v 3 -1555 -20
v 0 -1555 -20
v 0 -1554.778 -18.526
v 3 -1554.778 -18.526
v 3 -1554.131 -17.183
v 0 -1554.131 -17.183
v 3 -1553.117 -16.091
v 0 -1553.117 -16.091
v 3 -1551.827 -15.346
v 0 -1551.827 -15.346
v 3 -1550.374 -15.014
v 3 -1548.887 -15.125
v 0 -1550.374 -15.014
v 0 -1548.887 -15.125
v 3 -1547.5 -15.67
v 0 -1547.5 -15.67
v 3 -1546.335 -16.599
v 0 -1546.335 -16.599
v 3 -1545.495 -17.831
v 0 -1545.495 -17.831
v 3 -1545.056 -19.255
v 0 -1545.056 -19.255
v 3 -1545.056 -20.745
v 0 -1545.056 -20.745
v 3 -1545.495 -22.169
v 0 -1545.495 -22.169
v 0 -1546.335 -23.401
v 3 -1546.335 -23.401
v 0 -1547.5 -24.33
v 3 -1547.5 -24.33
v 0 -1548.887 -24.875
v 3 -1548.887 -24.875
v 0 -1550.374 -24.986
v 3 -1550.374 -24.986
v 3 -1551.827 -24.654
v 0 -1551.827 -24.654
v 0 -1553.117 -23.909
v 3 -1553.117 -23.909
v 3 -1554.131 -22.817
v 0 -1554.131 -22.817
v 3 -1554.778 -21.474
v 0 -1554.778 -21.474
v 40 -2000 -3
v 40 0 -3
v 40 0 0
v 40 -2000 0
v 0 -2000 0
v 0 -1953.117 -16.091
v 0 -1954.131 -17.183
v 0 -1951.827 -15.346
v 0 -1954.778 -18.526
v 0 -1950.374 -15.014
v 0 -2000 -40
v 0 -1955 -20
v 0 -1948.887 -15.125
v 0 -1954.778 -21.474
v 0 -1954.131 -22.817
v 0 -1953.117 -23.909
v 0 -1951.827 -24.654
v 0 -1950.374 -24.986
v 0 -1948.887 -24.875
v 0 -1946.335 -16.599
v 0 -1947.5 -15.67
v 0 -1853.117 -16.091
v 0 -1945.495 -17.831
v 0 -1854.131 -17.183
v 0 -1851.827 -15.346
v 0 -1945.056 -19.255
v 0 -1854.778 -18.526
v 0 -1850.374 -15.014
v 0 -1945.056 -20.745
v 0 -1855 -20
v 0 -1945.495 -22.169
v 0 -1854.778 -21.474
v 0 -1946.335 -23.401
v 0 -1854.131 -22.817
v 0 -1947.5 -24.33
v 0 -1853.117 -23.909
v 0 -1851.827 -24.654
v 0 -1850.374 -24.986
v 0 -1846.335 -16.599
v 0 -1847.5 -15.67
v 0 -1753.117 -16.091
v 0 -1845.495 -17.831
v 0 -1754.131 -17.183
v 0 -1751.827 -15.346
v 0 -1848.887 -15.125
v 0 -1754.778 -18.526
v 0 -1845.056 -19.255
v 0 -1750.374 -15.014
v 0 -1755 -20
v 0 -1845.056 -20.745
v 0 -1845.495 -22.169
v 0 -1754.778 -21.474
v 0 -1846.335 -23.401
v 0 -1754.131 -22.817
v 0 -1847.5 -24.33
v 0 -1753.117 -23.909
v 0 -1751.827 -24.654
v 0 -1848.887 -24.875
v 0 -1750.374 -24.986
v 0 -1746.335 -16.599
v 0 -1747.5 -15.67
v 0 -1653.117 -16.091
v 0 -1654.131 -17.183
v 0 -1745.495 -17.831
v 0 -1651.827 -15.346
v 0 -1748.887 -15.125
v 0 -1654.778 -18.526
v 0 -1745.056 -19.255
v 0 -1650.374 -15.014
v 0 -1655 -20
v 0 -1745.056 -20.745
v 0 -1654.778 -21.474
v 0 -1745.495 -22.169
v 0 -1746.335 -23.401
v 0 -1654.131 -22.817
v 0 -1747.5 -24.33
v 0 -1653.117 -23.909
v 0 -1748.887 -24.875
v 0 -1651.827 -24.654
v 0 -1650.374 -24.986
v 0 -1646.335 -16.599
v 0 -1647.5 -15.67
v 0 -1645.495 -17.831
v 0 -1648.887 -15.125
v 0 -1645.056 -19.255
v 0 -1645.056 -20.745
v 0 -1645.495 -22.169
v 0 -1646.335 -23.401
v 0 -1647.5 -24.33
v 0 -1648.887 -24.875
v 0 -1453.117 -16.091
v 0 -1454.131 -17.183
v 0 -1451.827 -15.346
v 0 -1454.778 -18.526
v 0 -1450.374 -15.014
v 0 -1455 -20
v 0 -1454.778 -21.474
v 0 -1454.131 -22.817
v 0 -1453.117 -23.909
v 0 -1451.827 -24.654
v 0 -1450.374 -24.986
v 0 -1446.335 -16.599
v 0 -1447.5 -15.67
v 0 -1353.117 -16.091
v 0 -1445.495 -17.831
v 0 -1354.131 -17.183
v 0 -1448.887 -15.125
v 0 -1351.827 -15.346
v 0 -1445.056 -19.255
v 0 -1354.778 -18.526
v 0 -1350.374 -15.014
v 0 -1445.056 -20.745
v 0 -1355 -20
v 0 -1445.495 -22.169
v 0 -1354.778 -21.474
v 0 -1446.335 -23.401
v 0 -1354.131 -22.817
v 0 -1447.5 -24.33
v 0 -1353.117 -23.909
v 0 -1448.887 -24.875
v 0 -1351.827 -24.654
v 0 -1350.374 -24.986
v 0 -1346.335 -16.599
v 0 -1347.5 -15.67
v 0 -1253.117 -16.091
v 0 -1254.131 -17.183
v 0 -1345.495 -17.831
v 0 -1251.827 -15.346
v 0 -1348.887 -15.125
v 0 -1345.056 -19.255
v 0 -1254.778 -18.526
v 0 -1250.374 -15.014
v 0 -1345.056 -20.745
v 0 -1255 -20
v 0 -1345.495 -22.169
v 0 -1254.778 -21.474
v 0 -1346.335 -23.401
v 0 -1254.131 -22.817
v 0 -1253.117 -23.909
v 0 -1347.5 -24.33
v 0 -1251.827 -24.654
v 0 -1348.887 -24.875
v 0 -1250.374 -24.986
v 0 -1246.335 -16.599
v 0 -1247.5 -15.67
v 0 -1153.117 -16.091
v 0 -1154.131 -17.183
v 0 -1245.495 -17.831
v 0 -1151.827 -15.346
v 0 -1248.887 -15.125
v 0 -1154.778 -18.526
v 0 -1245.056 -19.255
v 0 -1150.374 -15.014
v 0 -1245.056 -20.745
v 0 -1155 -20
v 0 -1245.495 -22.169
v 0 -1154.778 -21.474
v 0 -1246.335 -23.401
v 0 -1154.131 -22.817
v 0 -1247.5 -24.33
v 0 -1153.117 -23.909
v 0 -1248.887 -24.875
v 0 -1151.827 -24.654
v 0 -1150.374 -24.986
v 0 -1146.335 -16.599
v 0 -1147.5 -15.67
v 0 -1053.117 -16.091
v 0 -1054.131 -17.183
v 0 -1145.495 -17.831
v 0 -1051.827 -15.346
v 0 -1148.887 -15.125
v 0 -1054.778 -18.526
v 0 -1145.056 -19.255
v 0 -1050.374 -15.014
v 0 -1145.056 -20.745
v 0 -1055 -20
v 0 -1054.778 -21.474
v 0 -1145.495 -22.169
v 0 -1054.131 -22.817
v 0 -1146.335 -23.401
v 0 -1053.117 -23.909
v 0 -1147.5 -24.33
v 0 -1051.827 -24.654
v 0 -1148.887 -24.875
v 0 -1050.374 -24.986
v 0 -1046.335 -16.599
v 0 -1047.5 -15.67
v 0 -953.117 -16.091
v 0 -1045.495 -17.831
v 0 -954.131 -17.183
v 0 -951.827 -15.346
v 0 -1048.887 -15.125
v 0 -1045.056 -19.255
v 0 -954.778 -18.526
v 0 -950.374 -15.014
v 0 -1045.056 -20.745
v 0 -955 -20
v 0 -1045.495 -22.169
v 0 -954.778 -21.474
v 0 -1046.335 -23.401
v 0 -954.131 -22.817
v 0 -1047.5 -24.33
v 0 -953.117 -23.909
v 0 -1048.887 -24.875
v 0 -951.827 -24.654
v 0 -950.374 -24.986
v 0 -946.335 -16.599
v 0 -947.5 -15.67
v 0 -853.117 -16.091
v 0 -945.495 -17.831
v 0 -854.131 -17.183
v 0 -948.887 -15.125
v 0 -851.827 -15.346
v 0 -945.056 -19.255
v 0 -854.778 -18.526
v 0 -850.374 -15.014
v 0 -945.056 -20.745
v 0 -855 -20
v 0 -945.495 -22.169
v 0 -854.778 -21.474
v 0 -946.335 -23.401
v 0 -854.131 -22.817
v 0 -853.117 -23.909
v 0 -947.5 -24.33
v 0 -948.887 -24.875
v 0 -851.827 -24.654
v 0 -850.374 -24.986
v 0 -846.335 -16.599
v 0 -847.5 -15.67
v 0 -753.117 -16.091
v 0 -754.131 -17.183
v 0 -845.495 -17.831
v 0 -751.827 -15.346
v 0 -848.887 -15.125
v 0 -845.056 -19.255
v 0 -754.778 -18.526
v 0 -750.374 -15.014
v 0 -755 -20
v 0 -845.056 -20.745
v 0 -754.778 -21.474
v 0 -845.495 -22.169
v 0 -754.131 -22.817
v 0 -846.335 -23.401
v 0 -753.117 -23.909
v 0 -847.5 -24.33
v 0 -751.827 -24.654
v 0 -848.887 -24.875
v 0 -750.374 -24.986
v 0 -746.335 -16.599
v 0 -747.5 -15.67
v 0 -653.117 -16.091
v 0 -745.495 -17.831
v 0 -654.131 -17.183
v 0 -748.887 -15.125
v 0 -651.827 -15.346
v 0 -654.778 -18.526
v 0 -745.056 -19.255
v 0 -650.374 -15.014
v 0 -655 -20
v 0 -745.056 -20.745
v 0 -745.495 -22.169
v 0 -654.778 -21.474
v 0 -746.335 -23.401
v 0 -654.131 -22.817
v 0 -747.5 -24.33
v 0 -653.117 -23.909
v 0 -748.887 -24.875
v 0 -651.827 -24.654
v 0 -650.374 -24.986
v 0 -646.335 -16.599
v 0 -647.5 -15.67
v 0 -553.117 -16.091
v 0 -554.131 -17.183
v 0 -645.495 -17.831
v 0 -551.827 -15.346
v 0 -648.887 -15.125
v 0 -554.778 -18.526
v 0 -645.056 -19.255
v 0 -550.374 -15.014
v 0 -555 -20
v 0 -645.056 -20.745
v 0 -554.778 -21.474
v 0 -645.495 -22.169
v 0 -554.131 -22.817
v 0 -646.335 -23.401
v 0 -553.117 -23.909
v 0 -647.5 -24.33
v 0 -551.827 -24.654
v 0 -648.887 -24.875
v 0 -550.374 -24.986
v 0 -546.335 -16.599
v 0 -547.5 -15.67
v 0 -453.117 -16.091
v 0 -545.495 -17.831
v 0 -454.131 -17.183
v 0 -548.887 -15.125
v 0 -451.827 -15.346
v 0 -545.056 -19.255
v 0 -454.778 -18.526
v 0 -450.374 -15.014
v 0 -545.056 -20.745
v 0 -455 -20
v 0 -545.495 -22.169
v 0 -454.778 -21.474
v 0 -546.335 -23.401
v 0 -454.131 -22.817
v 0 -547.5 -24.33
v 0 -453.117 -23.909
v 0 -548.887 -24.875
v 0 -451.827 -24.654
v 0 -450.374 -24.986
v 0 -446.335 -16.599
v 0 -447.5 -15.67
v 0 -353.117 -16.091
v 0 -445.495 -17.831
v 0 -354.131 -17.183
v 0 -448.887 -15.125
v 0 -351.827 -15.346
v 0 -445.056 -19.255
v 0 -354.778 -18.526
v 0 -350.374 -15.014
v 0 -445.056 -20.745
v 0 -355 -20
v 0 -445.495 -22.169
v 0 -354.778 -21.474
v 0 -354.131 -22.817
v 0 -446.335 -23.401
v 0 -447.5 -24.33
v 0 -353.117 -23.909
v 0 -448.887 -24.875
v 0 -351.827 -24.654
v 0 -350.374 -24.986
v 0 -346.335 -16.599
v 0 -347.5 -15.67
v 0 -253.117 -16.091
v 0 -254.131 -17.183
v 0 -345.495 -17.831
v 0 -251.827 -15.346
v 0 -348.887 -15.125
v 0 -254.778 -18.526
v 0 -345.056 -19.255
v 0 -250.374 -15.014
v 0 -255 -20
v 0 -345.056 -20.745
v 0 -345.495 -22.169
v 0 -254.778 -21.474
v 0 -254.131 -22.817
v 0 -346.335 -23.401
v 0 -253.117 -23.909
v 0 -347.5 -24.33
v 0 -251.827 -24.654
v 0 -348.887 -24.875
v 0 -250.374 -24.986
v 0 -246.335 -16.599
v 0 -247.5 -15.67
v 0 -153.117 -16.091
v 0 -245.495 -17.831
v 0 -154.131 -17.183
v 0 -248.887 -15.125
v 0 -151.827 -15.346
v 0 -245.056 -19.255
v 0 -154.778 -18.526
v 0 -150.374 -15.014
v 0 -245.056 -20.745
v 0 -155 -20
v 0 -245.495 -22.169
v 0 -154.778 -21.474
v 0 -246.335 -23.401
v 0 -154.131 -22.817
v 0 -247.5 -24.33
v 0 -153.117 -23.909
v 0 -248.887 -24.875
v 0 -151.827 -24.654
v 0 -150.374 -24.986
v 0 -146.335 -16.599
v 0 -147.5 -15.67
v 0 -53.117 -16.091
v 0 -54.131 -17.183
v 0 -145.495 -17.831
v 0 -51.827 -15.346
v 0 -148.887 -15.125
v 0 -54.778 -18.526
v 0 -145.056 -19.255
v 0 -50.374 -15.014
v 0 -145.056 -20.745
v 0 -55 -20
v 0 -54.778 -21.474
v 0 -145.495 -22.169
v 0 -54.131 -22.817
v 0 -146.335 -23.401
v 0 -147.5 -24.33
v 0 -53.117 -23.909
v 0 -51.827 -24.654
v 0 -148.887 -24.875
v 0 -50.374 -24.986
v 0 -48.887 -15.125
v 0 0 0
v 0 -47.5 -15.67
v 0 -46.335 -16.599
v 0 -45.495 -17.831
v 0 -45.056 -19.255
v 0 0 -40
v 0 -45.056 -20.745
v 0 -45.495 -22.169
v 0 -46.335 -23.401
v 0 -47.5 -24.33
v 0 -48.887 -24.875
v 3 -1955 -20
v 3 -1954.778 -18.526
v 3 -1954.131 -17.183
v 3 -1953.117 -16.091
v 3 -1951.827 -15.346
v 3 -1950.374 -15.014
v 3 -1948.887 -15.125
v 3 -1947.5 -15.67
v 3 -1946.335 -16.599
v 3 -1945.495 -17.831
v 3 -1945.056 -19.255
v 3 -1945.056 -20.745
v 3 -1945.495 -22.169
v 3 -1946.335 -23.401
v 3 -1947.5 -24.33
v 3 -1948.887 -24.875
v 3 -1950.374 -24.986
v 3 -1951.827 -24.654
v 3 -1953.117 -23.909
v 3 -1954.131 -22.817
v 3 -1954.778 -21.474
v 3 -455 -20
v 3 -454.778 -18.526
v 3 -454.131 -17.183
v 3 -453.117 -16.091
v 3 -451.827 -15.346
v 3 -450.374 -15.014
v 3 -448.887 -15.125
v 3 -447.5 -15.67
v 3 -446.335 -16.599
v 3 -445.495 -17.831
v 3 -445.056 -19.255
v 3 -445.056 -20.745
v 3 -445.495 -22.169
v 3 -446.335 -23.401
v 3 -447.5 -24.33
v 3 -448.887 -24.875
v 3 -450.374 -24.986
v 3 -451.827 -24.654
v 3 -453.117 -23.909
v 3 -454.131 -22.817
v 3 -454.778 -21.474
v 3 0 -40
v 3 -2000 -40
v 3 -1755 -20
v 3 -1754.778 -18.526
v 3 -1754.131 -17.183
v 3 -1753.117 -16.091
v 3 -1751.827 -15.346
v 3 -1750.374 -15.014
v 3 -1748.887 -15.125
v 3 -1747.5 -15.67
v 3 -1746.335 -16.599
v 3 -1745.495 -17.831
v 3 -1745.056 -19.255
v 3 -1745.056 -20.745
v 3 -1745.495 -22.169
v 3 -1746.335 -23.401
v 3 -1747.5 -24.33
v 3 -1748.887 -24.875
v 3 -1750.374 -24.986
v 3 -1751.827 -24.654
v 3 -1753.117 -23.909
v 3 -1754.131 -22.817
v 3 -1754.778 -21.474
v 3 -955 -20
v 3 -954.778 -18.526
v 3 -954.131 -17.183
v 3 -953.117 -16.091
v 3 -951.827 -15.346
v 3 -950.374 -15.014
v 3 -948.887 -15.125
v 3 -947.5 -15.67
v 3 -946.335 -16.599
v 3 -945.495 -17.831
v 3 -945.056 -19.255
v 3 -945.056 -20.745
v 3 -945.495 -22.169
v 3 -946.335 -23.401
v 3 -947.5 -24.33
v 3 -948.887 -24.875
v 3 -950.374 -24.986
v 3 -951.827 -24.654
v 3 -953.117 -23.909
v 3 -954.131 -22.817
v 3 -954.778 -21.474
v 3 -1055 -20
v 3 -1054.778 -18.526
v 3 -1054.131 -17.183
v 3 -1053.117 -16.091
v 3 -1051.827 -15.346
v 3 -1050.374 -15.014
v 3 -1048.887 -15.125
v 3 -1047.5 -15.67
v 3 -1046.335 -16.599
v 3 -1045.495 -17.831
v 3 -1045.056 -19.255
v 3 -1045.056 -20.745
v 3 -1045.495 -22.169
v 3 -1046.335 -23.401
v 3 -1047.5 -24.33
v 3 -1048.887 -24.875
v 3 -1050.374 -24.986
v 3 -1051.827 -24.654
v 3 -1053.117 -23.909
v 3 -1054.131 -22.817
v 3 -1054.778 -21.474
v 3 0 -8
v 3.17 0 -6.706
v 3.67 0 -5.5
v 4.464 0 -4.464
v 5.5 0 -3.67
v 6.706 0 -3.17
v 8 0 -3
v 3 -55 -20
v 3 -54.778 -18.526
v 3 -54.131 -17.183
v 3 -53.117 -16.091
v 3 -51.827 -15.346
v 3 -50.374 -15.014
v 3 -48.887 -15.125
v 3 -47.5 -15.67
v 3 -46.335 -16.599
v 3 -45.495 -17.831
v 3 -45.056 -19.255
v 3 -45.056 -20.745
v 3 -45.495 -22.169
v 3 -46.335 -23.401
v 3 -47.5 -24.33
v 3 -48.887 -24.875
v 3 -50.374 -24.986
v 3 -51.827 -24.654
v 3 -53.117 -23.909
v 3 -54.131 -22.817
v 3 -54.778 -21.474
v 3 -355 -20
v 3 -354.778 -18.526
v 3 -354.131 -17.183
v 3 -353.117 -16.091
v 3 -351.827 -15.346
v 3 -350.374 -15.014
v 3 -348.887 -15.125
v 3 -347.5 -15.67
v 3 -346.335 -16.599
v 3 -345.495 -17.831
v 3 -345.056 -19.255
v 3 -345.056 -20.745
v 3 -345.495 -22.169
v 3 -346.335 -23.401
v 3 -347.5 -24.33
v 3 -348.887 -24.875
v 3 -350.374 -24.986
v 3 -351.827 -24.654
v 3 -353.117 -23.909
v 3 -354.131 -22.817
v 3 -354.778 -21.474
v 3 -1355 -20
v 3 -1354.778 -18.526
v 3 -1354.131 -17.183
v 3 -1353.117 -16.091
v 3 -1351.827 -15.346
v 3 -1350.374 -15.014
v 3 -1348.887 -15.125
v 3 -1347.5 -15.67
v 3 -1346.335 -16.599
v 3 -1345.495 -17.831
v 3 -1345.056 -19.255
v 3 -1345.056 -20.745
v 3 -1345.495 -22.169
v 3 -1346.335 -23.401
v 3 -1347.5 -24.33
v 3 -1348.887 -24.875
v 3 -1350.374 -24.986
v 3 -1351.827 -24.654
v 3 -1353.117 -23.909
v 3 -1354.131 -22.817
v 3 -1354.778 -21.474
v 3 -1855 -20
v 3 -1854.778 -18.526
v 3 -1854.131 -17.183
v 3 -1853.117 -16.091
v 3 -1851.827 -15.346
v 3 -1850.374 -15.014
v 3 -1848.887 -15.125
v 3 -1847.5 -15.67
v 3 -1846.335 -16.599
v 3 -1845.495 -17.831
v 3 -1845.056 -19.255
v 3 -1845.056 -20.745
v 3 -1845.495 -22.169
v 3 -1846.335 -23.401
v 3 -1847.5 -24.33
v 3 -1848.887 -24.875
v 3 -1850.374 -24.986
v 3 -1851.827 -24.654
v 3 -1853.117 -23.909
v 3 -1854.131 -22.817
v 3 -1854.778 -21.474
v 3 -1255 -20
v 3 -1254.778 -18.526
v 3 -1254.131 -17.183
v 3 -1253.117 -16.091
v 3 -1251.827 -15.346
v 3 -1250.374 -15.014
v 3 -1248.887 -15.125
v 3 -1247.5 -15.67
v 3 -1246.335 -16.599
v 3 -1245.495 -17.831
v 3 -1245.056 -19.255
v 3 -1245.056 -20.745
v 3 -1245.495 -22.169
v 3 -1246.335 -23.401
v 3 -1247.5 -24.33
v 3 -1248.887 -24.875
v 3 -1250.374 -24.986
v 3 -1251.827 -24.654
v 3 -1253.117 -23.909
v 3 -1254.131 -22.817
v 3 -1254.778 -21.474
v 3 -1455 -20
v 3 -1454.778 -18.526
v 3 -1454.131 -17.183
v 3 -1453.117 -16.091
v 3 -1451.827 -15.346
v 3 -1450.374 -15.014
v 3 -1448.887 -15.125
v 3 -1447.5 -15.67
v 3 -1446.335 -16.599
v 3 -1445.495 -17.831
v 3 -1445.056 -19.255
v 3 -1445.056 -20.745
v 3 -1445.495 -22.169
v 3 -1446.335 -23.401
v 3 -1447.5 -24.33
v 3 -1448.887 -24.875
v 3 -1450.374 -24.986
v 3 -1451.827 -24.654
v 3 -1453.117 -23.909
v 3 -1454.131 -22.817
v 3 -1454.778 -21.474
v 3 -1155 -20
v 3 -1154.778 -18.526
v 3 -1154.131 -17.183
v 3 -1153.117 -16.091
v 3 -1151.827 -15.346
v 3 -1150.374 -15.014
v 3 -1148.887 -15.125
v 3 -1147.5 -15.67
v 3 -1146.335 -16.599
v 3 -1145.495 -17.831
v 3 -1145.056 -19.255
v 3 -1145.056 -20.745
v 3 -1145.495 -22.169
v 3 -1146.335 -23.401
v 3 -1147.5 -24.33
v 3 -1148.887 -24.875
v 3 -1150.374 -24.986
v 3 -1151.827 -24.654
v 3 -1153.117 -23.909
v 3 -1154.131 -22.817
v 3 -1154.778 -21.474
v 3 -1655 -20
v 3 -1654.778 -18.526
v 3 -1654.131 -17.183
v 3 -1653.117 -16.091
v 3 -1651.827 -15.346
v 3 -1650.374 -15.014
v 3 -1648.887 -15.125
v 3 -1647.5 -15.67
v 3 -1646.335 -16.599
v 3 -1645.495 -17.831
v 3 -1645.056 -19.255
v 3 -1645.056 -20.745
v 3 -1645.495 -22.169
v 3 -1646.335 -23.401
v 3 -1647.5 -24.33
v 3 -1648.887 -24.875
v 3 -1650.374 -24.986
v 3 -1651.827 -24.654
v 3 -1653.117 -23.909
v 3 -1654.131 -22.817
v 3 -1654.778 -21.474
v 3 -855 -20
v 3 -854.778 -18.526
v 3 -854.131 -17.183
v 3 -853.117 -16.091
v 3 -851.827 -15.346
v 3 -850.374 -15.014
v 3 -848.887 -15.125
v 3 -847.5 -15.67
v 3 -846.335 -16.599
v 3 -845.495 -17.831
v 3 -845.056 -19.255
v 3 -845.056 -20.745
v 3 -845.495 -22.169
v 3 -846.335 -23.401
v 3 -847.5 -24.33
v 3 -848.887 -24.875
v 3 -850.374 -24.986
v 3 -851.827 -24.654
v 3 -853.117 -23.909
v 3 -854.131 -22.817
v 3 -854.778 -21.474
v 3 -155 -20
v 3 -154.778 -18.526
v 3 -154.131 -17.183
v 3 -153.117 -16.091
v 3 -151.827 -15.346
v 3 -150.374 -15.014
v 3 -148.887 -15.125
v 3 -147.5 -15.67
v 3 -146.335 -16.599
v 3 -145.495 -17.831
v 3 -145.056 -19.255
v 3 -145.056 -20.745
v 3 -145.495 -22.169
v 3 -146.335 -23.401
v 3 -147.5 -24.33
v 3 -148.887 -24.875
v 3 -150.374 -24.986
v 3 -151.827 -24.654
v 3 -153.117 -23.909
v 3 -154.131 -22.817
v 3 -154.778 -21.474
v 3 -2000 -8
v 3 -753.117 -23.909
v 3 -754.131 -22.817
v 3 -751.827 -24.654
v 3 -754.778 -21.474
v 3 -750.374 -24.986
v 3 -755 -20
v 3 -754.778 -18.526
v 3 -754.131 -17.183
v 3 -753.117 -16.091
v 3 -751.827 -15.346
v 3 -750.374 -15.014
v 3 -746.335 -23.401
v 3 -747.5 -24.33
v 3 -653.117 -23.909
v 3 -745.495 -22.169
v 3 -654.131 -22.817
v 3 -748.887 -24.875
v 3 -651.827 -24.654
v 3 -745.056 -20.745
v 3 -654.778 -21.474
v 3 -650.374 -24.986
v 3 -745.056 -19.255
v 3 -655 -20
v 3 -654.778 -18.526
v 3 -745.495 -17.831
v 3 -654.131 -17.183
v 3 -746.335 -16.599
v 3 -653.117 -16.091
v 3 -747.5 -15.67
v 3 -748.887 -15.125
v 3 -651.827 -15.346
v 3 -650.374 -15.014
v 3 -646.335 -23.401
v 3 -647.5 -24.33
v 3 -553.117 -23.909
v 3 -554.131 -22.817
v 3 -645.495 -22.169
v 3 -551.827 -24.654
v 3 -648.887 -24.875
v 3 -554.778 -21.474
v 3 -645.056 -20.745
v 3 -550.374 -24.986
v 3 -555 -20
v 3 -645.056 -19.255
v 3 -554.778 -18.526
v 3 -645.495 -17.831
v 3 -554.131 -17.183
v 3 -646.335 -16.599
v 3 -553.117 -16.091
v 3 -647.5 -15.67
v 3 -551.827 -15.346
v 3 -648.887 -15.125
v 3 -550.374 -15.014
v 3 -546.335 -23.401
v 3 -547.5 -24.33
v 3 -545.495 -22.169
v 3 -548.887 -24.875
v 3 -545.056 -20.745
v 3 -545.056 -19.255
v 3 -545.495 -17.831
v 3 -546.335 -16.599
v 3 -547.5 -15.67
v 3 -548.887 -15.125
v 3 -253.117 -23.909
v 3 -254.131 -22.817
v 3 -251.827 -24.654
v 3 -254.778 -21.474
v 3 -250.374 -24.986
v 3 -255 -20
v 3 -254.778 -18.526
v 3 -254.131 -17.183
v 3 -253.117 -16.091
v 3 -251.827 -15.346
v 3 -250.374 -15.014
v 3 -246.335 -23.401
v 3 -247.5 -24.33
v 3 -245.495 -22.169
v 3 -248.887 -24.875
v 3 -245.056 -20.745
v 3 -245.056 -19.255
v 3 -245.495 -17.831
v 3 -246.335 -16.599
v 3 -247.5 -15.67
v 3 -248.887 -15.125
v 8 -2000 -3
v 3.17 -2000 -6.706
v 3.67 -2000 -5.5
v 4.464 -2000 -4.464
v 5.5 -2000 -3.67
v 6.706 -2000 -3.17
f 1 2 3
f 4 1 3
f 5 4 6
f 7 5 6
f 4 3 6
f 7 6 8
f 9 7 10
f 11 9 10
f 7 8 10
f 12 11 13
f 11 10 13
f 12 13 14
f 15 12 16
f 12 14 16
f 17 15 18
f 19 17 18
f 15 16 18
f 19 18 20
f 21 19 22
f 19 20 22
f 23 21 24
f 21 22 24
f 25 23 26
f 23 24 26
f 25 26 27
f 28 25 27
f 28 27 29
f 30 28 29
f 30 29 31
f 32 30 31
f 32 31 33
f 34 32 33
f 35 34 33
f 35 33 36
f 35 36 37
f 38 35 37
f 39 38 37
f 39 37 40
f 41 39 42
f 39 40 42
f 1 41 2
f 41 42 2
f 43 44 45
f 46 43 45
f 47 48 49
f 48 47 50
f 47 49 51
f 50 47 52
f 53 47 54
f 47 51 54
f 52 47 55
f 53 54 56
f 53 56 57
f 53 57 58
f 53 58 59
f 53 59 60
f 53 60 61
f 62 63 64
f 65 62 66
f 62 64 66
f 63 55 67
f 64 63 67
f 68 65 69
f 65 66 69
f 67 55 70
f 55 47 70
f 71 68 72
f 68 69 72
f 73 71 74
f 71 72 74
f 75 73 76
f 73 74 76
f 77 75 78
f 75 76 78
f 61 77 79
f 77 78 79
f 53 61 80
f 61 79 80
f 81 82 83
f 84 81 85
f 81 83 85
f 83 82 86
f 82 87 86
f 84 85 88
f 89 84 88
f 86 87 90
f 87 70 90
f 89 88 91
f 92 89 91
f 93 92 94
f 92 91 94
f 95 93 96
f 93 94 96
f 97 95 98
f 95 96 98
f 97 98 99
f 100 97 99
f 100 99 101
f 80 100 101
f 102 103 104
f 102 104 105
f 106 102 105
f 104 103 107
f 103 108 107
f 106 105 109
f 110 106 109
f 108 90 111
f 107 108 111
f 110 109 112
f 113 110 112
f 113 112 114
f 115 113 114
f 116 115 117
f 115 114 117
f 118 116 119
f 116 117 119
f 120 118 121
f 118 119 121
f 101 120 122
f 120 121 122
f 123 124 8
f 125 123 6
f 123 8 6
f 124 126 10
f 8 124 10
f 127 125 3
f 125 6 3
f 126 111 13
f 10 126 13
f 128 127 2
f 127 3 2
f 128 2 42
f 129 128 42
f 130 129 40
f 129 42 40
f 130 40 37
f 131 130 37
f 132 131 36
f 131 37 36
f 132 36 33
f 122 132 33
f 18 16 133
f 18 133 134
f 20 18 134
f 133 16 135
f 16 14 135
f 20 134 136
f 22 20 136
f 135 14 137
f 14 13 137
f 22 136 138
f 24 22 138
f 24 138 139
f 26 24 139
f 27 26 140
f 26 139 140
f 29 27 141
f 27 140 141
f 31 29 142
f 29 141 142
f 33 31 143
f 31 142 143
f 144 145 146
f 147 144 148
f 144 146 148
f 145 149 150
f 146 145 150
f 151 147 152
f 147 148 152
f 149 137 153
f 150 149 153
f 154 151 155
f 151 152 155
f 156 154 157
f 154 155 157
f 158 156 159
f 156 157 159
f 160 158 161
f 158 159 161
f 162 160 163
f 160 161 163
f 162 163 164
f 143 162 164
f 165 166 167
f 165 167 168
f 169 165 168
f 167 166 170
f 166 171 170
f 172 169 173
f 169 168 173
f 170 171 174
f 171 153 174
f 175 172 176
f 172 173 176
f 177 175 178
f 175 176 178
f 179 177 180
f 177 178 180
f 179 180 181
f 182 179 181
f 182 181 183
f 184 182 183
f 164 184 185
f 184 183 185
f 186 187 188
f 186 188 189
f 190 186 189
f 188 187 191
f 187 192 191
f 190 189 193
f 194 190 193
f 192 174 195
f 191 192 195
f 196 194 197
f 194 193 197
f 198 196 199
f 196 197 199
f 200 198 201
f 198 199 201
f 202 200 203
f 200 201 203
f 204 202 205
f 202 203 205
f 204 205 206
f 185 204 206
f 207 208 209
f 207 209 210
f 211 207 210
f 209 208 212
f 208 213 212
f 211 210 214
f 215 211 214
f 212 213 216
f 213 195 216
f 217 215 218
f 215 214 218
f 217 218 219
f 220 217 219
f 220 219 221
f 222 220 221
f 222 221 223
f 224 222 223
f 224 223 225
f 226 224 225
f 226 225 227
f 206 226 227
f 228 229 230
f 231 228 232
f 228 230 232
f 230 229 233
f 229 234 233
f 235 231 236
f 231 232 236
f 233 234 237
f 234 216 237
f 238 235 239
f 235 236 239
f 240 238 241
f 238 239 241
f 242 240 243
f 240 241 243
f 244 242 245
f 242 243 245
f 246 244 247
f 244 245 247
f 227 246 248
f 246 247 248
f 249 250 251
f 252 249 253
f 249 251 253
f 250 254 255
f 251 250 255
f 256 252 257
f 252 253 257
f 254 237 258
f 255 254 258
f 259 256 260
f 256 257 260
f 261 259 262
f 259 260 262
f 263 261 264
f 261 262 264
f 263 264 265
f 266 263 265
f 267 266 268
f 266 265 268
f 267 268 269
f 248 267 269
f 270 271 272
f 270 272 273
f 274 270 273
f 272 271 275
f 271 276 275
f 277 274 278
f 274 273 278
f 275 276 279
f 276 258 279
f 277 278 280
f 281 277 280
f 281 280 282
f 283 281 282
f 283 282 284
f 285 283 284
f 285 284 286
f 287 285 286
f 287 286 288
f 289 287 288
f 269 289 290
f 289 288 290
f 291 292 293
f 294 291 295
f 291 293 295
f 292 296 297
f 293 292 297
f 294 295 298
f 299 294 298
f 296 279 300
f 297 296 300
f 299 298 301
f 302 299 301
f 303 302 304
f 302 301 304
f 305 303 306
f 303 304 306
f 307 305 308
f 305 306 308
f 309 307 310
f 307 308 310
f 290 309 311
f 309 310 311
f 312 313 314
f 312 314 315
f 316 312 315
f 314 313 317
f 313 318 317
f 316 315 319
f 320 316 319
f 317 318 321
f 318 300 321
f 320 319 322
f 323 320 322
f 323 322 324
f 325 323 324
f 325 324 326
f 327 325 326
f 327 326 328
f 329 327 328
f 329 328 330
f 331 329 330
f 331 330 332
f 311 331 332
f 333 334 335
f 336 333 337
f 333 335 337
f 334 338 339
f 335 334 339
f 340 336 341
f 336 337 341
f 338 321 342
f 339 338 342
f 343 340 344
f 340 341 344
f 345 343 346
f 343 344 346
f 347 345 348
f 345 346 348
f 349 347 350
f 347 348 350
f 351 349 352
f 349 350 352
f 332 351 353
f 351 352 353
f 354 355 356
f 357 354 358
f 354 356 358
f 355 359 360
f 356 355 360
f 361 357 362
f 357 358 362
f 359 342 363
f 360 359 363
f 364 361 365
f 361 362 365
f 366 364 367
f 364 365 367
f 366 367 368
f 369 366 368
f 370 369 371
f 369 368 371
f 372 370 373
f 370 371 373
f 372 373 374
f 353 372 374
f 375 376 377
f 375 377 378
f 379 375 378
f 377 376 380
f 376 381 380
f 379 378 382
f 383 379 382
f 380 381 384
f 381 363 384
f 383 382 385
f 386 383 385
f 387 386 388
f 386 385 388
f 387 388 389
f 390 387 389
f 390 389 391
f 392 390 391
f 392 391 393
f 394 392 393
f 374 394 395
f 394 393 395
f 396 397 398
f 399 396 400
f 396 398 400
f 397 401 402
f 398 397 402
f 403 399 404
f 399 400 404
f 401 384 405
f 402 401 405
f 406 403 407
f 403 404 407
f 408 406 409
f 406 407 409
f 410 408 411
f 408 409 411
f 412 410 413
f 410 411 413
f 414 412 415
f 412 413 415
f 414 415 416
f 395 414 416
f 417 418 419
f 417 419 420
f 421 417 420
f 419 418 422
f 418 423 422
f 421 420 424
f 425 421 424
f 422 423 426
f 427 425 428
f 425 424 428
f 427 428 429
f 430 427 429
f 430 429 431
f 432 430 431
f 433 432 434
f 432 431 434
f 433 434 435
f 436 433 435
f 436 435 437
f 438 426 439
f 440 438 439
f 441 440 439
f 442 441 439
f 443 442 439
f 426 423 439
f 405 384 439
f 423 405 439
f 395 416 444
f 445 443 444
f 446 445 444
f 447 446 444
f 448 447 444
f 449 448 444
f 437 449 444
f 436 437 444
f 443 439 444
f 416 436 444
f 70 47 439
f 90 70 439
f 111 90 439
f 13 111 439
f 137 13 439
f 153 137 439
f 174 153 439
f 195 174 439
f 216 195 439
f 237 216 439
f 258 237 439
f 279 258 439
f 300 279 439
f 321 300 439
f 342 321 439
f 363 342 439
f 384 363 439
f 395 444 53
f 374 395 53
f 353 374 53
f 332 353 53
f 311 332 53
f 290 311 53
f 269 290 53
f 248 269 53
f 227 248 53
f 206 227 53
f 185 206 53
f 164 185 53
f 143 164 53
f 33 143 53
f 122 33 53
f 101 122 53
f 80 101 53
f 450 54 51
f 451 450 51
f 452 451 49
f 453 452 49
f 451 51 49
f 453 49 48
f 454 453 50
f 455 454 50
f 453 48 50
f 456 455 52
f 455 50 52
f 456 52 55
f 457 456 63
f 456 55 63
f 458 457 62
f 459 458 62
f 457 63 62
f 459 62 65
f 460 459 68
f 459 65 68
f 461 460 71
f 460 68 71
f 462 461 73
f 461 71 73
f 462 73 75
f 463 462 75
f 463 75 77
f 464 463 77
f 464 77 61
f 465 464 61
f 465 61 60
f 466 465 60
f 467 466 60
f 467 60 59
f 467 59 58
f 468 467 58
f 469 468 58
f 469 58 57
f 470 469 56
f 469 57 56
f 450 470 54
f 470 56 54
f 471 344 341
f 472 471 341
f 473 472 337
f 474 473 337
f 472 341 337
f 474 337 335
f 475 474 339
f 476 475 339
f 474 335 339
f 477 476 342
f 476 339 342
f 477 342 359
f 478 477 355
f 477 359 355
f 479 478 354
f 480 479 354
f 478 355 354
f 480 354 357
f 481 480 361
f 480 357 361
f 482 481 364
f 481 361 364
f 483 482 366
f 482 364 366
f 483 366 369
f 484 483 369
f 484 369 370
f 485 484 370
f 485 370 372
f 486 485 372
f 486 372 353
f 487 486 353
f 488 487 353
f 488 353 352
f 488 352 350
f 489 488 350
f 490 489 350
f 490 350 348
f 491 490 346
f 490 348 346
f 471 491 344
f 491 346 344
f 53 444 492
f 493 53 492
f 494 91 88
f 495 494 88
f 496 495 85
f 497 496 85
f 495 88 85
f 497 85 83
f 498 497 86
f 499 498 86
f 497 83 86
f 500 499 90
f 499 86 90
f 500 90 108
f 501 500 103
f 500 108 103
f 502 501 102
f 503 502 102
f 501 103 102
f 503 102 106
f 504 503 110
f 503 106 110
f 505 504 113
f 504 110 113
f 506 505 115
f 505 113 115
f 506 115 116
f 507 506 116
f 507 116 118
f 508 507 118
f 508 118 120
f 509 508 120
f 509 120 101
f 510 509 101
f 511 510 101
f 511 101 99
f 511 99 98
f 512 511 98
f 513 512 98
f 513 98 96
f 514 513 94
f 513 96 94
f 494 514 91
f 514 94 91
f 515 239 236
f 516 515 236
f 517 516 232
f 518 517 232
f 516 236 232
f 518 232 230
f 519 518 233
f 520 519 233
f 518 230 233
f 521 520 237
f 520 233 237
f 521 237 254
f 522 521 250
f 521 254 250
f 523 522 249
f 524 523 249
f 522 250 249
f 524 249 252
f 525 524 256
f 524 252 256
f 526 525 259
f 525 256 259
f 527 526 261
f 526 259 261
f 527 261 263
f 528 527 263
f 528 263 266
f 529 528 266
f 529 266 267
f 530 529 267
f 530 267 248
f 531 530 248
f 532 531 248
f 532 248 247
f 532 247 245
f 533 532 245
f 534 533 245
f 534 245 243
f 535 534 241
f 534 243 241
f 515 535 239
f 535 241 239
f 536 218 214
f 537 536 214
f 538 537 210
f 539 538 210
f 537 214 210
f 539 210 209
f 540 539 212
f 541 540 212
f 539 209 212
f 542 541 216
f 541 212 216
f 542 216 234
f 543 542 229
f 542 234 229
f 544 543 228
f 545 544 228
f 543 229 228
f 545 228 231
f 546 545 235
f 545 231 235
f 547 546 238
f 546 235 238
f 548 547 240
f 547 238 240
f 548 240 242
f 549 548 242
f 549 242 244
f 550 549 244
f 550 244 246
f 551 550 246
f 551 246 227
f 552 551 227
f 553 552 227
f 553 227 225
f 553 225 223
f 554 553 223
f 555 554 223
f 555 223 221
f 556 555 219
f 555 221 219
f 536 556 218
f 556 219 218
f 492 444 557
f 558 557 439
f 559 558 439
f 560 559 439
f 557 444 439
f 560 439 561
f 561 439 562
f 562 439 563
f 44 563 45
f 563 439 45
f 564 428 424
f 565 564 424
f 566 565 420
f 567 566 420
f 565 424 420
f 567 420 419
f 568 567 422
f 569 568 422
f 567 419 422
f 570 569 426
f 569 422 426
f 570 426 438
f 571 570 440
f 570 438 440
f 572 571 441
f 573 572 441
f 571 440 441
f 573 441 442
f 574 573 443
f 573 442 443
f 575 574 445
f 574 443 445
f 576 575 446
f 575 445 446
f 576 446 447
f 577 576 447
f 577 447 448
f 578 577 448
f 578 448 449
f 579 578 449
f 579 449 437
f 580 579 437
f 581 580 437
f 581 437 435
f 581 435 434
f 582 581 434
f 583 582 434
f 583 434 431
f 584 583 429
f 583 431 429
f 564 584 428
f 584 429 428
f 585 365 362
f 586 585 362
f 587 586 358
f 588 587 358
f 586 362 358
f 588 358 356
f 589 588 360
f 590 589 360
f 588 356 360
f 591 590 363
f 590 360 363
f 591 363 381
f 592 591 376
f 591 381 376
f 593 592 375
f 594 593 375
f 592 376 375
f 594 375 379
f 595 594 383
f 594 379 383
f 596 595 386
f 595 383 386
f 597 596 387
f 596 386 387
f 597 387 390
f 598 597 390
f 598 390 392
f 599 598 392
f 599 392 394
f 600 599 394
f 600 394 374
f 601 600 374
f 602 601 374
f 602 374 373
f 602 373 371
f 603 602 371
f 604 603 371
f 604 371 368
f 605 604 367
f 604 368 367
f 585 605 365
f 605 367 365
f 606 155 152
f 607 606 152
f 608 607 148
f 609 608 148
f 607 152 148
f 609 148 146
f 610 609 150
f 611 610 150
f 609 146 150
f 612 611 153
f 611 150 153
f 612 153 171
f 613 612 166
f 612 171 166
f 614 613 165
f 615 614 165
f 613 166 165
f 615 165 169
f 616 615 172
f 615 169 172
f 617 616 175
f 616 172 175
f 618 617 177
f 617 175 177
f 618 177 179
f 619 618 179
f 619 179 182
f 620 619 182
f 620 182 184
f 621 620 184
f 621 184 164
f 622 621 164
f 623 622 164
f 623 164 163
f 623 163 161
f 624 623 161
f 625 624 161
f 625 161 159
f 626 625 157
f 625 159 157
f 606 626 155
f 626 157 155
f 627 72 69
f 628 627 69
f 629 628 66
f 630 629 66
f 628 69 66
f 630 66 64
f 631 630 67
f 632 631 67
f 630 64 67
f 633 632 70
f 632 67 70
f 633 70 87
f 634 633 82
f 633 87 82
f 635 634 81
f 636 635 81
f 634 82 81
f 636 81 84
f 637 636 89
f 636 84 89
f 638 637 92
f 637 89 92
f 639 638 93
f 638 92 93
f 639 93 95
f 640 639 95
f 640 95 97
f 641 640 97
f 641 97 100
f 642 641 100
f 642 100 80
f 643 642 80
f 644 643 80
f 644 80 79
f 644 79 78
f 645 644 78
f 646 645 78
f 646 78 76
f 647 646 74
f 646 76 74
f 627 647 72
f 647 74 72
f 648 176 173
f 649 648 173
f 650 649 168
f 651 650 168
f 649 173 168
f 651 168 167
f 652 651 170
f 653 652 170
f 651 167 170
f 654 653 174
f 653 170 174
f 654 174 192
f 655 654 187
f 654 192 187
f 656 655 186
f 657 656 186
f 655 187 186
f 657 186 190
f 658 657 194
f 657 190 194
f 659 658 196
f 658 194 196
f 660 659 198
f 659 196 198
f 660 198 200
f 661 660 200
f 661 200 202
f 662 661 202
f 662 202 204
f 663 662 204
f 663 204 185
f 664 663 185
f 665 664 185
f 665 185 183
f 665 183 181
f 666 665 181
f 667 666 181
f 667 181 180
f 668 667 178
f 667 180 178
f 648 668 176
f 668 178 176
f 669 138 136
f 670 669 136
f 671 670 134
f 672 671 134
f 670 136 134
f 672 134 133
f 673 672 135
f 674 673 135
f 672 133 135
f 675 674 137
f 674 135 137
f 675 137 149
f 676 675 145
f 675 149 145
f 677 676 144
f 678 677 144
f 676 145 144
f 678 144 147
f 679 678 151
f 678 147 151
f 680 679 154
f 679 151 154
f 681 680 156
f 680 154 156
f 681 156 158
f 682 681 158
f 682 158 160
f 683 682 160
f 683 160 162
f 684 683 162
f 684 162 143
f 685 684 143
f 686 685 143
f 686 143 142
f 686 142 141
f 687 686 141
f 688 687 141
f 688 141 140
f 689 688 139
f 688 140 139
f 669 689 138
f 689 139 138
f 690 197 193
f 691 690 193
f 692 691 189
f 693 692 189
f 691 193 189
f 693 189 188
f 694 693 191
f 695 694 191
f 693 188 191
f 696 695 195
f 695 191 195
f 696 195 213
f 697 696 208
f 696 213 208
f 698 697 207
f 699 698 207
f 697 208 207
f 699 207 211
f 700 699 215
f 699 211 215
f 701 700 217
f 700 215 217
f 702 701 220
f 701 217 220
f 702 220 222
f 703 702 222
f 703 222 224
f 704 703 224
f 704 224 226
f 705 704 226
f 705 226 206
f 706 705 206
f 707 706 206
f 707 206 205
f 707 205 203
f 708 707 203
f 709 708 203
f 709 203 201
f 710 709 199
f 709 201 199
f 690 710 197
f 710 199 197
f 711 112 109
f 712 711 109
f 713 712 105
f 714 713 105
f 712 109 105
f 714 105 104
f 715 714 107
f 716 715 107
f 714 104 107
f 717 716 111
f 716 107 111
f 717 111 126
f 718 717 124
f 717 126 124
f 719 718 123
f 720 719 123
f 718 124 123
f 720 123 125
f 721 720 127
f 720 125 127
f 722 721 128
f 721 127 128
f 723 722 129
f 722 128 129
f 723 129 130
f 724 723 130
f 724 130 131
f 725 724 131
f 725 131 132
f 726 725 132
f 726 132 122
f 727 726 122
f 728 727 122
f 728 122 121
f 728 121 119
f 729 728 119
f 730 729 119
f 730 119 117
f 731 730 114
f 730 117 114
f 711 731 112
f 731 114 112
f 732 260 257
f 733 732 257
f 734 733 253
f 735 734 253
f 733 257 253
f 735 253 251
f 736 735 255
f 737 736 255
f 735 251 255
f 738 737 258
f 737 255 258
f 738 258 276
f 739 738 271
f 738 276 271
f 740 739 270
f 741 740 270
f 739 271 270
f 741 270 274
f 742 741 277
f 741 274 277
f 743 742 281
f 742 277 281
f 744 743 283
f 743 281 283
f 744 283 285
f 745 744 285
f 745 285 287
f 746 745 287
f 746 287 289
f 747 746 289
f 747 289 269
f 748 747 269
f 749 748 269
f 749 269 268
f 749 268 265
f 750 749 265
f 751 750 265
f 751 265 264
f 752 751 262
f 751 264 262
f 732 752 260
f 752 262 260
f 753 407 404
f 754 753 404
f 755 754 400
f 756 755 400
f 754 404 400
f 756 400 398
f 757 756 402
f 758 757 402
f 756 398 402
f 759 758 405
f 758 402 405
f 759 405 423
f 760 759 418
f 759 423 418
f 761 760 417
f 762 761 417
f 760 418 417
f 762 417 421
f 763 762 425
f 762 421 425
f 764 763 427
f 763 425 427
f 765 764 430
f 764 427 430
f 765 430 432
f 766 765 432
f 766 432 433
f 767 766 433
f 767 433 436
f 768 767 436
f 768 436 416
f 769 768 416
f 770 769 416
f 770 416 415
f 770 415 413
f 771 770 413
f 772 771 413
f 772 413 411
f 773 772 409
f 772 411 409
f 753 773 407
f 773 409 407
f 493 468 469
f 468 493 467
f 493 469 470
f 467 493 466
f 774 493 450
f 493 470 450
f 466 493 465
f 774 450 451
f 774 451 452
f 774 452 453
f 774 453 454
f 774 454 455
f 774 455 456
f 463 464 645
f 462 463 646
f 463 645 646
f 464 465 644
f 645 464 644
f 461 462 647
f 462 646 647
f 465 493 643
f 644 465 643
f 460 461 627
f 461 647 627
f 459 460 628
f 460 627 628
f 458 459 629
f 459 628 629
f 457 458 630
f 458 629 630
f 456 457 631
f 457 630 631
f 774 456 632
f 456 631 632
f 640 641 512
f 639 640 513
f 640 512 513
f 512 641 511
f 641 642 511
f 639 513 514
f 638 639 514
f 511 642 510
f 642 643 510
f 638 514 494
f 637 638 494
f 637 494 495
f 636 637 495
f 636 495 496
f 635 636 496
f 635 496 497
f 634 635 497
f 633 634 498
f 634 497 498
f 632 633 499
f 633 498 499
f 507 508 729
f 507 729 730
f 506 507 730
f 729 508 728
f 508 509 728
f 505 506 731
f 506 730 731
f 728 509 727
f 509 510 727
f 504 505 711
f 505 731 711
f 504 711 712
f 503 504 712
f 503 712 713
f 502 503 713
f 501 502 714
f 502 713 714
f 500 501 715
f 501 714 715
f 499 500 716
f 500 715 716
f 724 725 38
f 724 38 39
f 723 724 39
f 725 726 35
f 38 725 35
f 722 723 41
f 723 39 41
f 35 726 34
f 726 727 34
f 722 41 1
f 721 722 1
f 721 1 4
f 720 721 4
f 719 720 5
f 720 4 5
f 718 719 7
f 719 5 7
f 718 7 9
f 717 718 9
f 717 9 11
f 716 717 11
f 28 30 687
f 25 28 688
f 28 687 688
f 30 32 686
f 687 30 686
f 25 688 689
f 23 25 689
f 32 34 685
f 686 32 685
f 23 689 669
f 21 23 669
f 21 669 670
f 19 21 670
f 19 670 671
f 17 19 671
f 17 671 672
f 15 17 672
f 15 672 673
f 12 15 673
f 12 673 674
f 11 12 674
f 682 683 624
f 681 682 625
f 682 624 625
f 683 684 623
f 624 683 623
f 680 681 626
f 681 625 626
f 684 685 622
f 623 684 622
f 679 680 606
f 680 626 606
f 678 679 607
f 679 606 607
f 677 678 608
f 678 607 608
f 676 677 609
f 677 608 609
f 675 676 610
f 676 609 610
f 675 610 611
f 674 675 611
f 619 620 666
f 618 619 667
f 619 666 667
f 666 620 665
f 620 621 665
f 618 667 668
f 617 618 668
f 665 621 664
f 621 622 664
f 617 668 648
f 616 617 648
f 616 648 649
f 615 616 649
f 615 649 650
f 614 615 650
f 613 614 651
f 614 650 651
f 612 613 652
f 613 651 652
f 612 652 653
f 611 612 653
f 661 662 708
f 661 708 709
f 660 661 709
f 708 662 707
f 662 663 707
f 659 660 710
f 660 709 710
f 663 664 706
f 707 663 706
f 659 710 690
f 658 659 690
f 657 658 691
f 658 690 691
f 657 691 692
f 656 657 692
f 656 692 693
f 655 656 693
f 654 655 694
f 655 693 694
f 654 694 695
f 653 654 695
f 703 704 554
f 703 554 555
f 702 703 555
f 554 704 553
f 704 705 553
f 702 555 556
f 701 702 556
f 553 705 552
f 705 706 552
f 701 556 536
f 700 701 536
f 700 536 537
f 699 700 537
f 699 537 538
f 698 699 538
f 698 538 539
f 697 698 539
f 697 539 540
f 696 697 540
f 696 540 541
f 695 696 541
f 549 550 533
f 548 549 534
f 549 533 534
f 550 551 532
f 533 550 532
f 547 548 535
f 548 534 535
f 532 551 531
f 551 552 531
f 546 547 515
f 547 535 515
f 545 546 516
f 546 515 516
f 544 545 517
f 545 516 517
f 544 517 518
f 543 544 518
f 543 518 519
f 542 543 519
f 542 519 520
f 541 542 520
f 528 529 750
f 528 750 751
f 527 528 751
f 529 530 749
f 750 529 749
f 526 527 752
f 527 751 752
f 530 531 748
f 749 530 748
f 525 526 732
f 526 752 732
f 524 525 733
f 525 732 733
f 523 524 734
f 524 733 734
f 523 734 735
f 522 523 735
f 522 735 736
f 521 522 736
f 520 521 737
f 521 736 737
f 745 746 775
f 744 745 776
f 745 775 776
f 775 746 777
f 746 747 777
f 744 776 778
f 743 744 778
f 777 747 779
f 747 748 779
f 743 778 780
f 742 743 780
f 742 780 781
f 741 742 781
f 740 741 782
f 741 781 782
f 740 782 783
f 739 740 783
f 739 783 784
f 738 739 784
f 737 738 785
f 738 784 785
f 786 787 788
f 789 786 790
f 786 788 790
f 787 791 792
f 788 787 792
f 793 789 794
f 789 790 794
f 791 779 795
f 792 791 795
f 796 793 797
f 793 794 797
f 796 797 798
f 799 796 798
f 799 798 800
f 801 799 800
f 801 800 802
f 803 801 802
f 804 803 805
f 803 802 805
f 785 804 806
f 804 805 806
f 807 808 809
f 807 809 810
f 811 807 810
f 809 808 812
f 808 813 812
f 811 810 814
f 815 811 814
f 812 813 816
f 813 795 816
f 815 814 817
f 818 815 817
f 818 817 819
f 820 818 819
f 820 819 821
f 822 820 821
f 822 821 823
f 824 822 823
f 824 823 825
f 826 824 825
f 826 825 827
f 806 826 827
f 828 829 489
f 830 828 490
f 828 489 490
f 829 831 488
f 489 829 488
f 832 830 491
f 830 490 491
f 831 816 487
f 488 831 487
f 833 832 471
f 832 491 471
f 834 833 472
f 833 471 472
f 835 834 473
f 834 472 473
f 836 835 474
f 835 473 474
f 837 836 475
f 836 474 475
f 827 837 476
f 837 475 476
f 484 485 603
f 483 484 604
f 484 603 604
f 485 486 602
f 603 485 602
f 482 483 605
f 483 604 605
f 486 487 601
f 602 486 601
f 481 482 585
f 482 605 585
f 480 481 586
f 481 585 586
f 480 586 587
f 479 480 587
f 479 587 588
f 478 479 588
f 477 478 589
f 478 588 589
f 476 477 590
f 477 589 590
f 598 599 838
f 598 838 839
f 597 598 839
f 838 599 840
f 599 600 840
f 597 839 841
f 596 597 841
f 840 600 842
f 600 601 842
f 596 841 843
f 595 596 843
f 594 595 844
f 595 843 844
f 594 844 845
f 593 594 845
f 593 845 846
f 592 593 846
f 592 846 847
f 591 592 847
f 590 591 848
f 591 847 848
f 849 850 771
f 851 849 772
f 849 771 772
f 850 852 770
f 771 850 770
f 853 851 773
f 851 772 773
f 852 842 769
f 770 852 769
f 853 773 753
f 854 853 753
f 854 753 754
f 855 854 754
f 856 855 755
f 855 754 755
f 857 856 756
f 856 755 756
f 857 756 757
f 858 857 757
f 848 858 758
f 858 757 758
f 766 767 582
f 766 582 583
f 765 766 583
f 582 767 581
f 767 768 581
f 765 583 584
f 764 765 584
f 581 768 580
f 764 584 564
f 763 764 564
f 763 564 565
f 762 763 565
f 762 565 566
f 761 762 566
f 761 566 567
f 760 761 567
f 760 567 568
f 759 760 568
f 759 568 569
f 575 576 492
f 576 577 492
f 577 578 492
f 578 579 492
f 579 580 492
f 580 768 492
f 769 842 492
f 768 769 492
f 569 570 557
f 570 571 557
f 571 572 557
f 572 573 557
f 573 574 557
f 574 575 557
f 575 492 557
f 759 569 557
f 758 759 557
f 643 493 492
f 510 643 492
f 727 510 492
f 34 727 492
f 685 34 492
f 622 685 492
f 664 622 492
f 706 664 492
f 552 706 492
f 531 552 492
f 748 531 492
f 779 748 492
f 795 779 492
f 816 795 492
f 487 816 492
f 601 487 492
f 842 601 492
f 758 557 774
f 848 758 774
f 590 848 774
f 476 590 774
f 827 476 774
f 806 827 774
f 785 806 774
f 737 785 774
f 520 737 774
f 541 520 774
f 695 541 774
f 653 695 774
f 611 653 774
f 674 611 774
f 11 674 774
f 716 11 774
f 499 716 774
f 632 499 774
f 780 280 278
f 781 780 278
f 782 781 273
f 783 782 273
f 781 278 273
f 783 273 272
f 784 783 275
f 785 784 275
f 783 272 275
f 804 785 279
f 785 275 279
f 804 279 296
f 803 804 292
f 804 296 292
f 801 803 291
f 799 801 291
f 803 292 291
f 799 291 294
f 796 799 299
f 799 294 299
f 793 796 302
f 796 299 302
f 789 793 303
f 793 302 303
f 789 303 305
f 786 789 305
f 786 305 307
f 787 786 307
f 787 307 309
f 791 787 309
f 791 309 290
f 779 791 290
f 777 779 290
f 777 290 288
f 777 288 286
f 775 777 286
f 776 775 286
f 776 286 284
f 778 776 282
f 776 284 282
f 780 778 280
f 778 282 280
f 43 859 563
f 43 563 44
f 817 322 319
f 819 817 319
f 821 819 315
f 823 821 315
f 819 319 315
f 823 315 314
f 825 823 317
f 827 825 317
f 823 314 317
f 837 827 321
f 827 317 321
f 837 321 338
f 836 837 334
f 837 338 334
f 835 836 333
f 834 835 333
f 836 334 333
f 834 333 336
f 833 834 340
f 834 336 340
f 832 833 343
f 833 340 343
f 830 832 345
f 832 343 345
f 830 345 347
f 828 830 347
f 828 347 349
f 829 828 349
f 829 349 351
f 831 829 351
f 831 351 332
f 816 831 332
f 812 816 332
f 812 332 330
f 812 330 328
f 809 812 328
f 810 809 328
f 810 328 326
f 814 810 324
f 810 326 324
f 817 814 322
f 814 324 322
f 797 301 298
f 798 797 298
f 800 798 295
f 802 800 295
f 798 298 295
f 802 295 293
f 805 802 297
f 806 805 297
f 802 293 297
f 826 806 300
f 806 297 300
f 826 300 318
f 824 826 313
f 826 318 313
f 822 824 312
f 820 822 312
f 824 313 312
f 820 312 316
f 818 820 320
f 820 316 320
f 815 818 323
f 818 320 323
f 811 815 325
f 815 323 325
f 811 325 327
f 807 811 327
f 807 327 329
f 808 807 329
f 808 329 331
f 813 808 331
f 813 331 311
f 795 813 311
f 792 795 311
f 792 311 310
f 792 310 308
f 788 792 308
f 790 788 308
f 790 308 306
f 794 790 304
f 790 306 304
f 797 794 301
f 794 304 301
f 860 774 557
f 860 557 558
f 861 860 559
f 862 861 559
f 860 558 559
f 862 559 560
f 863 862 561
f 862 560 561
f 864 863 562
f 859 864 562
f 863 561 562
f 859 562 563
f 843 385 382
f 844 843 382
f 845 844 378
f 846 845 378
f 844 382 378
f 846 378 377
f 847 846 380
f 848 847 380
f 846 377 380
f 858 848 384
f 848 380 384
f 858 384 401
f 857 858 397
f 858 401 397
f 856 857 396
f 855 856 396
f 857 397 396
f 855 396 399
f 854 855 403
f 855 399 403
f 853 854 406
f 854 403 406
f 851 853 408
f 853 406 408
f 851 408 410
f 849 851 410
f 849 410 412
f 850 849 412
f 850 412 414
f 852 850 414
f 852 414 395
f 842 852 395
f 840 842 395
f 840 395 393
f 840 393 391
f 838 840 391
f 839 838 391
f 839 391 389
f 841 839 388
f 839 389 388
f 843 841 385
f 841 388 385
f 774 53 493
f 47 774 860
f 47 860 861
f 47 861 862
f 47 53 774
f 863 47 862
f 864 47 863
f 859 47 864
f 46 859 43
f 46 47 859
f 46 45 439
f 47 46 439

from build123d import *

# Parameters (mm, degrees)
F1_DEPTH = 2000
F2_R     = 5
F3_DEPTH = 3


with BuildPart() as f1:
    # F0 (on Front) → F1 (new body)
    with BuildSketch(Plane.XZ):
        with BuildLine():
            Line((40, 0), (0, 0))
            Line((0, 0), (0, -40))
            Line((0, -40), (3, -40))
            Line((3, -40), (3, -8))
            ThreePointArc((3, -8), (4.464466, -4.464466), (8, -3))
            Line((8, -3), (40, -3))
            Line((40, -3), (40, 0))
        make_face()
    extrude(amount=F1_DEPTH)

    # F2 (on face) → F3 (cut, through all)
    with BuildSketch(Plane(origin=(0, 0, 0), x_dir=(0, -1, 0), z_dir=(-1, 0, 0))):
        with Locations((50, -20)):
            Circle(F2_R)
        with Locations((150, -20)):
            Circle(F2_R)
        with Locations((250, -20)):
            Circle(F2_R)
        with Locations((350, -20)):
            Circle(F2_R)
        with Locations((450, -20)):
            Circle(F2_R)
        with Locations((550, -20)):
            Circle(F2_R)
        with Locations((650, -20)):
            Circle(F2_R)
        with Locations((750, -20)):
            Circle(F2_R)
        with Locations((850, -20)):
            Circle(F2_R)
        with Locations((950, -20)):
            Circle(F2_R)
        with Locations((1050, -20)):
            Circle(F2_R)
        with Locations((1150, -20)):
            Circle(F2_R)
        with Locations((1250, -20)):
            Circle(F2_R)
        with Locations((1350, -20)):
            Circle(F2_R)
        with Locations((1450, -20)):
            Circle(F2_R)
        with Locations((1550, -20)):
            Circle(F2_R)
        with Locations((1650, -20)):
            Circle(F2_R)
        with Locations((1750, -20)):
            Circle(F2_R)
        with Locations((1850, -20)):
            Circle(F2_R)
        with Locations((1950, -20)):
            Circle(F2_R)
        with Locations((2050, -20)):
            Circle(F2_R)
        with Locations((2150, -20)):
            Circle(F2_R)
        with Locations((2250, -20)):
            Circle(F2_R)
        with Locations((2350, -20)):
            Circle(F2_R)
        with Locations((2450, -20)):
            Circle(F2_R)
    extrude(amount=-F3_DEPTH, mode=Mode.SUBTRACT)


solid = f1.part
